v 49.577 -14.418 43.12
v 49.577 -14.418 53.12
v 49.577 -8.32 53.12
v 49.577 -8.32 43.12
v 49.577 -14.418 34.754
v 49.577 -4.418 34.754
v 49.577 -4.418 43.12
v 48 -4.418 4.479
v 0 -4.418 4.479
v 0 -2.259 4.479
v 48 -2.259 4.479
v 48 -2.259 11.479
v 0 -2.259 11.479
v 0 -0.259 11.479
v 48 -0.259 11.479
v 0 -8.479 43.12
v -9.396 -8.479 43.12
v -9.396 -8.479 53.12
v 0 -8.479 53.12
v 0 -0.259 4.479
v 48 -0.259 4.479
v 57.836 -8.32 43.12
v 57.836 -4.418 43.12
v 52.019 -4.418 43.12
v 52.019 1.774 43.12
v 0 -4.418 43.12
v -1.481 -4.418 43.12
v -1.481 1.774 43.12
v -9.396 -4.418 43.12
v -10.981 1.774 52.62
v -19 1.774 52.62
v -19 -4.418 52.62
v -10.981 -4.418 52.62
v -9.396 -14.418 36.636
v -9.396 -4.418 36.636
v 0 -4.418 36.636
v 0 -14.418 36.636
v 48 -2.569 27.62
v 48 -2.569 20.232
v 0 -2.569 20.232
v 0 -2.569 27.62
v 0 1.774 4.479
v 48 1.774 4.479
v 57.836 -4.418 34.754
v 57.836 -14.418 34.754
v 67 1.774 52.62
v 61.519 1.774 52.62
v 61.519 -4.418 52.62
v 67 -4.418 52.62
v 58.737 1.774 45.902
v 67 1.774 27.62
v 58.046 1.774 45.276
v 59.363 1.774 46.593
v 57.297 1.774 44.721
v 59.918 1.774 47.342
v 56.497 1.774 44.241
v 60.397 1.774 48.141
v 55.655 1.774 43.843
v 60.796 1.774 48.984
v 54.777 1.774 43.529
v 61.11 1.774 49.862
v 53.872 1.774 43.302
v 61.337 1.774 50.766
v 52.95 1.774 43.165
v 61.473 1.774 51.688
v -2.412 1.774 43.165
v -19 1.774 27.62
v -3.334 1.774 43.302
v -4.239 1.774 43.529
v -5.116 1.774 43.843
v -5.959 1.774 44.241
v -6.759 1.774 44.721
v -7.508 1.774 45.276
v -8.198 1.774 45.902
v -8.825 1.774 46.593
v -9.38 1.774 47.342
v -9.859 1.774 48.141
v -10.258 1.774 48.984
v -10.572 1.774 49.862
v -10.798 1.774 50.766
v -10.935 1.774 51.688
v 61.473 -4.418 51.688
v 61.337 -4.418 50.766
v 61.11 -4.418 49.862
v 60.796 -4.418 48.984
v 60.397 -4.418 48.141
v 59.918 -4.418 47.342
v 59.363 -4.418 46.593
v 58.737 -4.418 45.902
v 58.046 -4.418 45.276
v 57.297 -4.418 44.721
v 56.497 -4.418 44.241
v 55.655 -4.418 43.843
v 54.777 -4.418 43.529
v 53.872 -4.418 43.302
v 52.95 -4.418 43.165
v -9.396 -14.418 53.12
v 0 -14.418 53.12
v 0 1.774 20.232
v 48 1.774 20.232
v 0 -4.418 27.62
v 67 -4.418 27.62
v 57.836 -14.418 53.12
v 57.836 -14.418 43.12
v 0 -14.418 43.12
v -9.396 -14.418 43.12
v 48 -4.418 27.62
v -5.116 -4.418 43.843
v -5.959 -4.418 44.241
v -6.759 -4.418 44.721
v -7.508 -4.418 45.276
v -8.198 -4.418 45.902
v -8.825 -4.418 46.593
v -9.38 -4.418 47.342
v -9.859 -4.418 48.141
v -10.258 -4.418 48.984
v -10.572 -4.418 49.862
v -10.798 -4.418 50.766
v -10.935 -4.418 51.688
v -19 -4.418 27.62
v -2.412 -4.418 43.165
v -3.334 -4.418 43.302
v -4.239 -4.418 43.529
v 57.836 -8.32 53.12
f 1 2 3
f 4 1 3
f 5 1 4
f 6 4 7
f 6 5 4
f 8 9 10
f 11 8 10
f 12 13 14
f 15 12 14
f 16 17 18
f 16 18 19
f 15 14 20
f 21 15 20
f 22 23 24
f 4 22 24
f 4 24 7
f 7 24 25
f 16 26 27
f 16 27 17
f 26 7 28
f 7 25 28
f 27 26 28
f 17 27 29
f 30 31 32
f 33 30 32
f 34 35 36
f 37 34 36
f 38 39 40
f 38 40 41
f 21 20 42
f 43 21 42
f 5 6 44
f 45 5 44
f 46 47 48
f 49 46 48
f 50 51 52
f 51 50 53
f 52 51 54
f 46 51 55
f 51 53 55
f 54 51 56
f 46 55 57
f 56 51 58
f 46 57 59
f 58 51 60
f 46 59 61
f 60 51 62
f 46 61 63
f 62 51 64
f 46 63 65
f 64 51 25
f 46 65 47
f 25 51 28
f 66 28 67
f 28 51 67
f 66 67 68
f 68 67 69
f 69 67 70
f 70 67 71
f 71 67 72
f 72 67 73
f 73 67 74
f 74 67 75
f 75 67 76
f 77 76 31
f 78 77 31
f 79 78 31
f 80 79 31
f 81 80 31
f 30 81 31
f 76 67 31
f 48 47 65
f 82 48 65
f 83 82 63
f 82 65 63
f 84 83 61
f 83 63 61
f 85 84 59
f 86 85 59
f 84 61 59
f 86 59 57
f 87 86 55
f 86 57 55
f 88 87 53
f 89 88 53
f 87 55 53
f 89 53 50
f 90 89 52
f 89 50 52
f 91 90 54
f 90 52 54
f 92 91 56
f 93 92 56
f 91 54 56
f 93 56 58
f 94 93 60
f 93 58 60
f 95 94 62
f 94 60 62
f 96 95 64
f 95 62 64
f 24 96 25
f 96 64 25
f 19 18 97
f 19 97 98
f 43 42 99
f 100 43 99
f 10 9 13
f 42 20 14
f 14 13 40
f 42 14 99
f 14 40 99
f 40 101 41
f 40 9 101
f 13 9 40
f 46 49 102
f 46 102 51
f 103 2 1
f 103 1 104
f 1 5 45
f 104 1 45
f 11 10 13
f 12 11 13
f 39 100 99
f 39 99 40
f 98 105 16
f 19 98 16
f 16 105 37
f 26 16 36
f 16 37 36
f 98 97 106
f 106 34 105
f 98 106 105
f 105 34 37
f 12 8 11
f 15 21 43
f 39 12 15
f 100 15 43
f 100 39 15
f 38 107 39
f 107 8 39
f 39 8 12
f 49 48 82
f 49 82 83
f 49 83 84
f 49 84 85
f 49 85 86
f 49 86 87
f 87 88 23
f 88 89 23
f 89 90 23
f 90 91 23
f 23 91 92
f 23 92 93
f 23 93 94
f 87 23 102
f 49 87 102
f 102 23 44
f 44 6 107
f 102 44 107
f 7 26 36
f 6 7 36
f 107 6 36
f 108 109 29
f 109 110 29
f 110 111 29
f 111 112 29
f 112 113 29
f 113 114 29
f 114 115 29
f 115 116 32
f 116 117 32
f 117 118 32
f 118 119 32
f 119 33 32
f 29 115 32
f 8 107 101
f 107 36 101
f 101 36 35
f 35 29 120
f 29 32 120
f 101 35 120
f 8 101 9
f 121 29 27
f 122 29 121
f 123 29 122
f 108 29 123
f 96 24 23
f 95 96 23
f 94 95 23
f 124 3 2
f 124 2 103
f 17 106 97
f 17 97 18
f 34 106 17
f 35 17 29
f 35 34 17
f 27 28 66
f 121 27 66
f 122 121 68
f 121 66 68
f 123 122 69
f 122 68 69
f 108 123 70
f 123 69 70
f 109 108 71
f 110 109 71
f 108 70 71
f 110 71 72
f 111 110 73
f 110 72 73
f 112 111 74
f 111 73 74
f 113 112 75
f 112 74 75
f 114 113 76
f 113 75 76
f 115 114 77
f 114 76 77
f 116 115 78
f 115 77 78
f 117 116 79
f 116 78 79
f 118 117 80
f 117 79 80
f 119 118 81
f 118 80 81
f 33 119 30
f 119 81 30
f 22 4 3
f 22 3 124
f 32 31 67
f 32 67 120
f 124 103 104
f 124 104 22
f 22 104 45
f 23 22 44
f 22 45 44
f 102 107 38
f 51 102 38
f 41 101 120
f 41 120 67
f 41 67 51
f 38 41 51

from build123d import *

# Parameters (mm, degrees)
F1_DEPTH  = 48
F3_DEPTH  = 19
F5_DEPTH  = 19
F7_DEPTH  = 25
F9_DEPTH  = 10
F10_W     = 9.3963341787
F10_H     = 5.939177354
F11_DEPTH = 10
F12_W     = 8.2590989769
F12_H     = 6.0978346739
F13_DEPTH = 10


with BuildPart() as f1:
    # F0 (on Right) → F1 (new body)
    with BuildSketch(Plane.YZ):
        Polygon((-4.4177471522, 4.4790807286), (-2.2589041686, 4.4790807286), (-2.2589041686, 11.4790807286), (-0.2589041686, 11.4790807286), (-0.2589041686, 4.4790807286), (1.774286502, 4.4790807286), (1.774286502, 20.2315860614), (-2.5690435432, 20.2315860614), (-2.5690435432, 27.6196174324), (1.774286502, 27.6196174324), (1.774286502, 52.6196174324), (-4.4177471522, 52.6196174324), align=None)
    extrude(amount=F1_DEPTH)

    # F2 (on face) → F3 (join)
    with BuildSketch(Plane(origin=(0, 0, 0), x_dir=(0, -1, 0), z_dir=(-1, 0, 0))):
        Polygon((2.5690435432, 27.6196174324), (4.4177471522, 27.6196174324), (4.4177471522, 52.6196174324), (-1.774286502, 52.6196174324), (-1.774286502, 27.6196174324), align=None)
    extrude(amount=F3_DEPTH)

    # F4 (on face) → F5 (join)
    with BuildSketch(Plane.YZ.offset(48)):
        Polygon((1.774286502, 52.6196174324), (-4.4177471522, 52.6196174324), (-4.4177471522, 27.6196174324), (-2.5690435432, 27.6196174324), (1.774286502, 27.6196174324), align=None)
    extrude(amount=F5_DEPTH)

    # F6 (on face) → F7 (cut)
    with BuildSketch(Plane(origin=(0, 1.774286502, 0), x_dir=(-1, 0, 0), z_dir=(0, 1, 0))):
        with BuildLine():
            ThreePointArc((-61.5190799241, 52.6196174324), (-58.7365943454, 45.9021030111), (-52.0190799241, 43.1196174324))
            ThreePointArc((-52.0190799241, 43.1196174324), (-45.3015655028, 45.9021030111), (-42.5190799241, 52.6196174324))
            Line((-42.5190799241, 52.6196174324), (-61.5190799241, 52.6196174324))
        make_face()
        with BuildLine():
            ThreePointArc((-8.0190799241, 52.6196174324), (-5.2365943454, 45.9021030111), (1.4809200759, 43.1196174324))
            ThreePointArc((1.4809200759, 43.1196174324), (8.1984344972, 45.9021030111), (10.9809200759, 52.6196174324))
            Line((10.9809200759, 52.6196174324), (-8.0190799241, 52.6196174324))
        make_face()
        with BuildLine():
            ThreePointArc((-42.5190799241, 52.6196174324), (-45.3015655028, 45.9021030111), (-52.0190799241, 43.1196174324))
            Line((-52.0190799241, 43.1196174324), (1.4809200759, 43.1196174324))
            ThreePointArc((1.4809200759, 43.1196174324), (-5.2365943454, 45.9021030111), (-8.0190799241, 52.6196174324))
            Line((-8.0190799241, 52.6196174324), (-42.5190799241, 52.6196174324))
        make_face()
    extrude(amount=-F7_DEPTH, mode=Mode.SUBTRACT)

    # F8 (on face) → F9 (join)
    with BuildSketch(Plane.XZ.offset(4.4177471522)):
        Polygon((0, 36.6360321641), (0, 43.1196174324), (-1.4809200759, 43.1196174324), (-9.3963341787, 43.1196174324), (-9.3963341787, 36.6360321641), align=None)
        Polygon((52.0190799241, 43.1196174324), (49.577344209, 43.1196174324), (49.577344209, 34.7543694079), (57.8364431858, 34.7543694079), (57.8364431858, 43.1196174324), align=None)
    extrude(amount=F9_DEPTH)

    # F10 (on face) → F11 (join)
    with BuildSketch(Plane.XY.offset(43.1196174324)):
        with Locations((-4.6981670894, -11.4481584752)):
            Rectangle(F10_W, F10_H)
    extrude(amount=F11_DEPTH)

    # F12 (on face) → F13 (join)
    with BuildSketch(Plane.XY.offset(43.1196174324)):
        with Locations((53.7068936974, -11.3688298153)):
            Rectangle(F12_W, F12_H)
    extrude(amount=F13_DEPTH)


solid = f1.part
